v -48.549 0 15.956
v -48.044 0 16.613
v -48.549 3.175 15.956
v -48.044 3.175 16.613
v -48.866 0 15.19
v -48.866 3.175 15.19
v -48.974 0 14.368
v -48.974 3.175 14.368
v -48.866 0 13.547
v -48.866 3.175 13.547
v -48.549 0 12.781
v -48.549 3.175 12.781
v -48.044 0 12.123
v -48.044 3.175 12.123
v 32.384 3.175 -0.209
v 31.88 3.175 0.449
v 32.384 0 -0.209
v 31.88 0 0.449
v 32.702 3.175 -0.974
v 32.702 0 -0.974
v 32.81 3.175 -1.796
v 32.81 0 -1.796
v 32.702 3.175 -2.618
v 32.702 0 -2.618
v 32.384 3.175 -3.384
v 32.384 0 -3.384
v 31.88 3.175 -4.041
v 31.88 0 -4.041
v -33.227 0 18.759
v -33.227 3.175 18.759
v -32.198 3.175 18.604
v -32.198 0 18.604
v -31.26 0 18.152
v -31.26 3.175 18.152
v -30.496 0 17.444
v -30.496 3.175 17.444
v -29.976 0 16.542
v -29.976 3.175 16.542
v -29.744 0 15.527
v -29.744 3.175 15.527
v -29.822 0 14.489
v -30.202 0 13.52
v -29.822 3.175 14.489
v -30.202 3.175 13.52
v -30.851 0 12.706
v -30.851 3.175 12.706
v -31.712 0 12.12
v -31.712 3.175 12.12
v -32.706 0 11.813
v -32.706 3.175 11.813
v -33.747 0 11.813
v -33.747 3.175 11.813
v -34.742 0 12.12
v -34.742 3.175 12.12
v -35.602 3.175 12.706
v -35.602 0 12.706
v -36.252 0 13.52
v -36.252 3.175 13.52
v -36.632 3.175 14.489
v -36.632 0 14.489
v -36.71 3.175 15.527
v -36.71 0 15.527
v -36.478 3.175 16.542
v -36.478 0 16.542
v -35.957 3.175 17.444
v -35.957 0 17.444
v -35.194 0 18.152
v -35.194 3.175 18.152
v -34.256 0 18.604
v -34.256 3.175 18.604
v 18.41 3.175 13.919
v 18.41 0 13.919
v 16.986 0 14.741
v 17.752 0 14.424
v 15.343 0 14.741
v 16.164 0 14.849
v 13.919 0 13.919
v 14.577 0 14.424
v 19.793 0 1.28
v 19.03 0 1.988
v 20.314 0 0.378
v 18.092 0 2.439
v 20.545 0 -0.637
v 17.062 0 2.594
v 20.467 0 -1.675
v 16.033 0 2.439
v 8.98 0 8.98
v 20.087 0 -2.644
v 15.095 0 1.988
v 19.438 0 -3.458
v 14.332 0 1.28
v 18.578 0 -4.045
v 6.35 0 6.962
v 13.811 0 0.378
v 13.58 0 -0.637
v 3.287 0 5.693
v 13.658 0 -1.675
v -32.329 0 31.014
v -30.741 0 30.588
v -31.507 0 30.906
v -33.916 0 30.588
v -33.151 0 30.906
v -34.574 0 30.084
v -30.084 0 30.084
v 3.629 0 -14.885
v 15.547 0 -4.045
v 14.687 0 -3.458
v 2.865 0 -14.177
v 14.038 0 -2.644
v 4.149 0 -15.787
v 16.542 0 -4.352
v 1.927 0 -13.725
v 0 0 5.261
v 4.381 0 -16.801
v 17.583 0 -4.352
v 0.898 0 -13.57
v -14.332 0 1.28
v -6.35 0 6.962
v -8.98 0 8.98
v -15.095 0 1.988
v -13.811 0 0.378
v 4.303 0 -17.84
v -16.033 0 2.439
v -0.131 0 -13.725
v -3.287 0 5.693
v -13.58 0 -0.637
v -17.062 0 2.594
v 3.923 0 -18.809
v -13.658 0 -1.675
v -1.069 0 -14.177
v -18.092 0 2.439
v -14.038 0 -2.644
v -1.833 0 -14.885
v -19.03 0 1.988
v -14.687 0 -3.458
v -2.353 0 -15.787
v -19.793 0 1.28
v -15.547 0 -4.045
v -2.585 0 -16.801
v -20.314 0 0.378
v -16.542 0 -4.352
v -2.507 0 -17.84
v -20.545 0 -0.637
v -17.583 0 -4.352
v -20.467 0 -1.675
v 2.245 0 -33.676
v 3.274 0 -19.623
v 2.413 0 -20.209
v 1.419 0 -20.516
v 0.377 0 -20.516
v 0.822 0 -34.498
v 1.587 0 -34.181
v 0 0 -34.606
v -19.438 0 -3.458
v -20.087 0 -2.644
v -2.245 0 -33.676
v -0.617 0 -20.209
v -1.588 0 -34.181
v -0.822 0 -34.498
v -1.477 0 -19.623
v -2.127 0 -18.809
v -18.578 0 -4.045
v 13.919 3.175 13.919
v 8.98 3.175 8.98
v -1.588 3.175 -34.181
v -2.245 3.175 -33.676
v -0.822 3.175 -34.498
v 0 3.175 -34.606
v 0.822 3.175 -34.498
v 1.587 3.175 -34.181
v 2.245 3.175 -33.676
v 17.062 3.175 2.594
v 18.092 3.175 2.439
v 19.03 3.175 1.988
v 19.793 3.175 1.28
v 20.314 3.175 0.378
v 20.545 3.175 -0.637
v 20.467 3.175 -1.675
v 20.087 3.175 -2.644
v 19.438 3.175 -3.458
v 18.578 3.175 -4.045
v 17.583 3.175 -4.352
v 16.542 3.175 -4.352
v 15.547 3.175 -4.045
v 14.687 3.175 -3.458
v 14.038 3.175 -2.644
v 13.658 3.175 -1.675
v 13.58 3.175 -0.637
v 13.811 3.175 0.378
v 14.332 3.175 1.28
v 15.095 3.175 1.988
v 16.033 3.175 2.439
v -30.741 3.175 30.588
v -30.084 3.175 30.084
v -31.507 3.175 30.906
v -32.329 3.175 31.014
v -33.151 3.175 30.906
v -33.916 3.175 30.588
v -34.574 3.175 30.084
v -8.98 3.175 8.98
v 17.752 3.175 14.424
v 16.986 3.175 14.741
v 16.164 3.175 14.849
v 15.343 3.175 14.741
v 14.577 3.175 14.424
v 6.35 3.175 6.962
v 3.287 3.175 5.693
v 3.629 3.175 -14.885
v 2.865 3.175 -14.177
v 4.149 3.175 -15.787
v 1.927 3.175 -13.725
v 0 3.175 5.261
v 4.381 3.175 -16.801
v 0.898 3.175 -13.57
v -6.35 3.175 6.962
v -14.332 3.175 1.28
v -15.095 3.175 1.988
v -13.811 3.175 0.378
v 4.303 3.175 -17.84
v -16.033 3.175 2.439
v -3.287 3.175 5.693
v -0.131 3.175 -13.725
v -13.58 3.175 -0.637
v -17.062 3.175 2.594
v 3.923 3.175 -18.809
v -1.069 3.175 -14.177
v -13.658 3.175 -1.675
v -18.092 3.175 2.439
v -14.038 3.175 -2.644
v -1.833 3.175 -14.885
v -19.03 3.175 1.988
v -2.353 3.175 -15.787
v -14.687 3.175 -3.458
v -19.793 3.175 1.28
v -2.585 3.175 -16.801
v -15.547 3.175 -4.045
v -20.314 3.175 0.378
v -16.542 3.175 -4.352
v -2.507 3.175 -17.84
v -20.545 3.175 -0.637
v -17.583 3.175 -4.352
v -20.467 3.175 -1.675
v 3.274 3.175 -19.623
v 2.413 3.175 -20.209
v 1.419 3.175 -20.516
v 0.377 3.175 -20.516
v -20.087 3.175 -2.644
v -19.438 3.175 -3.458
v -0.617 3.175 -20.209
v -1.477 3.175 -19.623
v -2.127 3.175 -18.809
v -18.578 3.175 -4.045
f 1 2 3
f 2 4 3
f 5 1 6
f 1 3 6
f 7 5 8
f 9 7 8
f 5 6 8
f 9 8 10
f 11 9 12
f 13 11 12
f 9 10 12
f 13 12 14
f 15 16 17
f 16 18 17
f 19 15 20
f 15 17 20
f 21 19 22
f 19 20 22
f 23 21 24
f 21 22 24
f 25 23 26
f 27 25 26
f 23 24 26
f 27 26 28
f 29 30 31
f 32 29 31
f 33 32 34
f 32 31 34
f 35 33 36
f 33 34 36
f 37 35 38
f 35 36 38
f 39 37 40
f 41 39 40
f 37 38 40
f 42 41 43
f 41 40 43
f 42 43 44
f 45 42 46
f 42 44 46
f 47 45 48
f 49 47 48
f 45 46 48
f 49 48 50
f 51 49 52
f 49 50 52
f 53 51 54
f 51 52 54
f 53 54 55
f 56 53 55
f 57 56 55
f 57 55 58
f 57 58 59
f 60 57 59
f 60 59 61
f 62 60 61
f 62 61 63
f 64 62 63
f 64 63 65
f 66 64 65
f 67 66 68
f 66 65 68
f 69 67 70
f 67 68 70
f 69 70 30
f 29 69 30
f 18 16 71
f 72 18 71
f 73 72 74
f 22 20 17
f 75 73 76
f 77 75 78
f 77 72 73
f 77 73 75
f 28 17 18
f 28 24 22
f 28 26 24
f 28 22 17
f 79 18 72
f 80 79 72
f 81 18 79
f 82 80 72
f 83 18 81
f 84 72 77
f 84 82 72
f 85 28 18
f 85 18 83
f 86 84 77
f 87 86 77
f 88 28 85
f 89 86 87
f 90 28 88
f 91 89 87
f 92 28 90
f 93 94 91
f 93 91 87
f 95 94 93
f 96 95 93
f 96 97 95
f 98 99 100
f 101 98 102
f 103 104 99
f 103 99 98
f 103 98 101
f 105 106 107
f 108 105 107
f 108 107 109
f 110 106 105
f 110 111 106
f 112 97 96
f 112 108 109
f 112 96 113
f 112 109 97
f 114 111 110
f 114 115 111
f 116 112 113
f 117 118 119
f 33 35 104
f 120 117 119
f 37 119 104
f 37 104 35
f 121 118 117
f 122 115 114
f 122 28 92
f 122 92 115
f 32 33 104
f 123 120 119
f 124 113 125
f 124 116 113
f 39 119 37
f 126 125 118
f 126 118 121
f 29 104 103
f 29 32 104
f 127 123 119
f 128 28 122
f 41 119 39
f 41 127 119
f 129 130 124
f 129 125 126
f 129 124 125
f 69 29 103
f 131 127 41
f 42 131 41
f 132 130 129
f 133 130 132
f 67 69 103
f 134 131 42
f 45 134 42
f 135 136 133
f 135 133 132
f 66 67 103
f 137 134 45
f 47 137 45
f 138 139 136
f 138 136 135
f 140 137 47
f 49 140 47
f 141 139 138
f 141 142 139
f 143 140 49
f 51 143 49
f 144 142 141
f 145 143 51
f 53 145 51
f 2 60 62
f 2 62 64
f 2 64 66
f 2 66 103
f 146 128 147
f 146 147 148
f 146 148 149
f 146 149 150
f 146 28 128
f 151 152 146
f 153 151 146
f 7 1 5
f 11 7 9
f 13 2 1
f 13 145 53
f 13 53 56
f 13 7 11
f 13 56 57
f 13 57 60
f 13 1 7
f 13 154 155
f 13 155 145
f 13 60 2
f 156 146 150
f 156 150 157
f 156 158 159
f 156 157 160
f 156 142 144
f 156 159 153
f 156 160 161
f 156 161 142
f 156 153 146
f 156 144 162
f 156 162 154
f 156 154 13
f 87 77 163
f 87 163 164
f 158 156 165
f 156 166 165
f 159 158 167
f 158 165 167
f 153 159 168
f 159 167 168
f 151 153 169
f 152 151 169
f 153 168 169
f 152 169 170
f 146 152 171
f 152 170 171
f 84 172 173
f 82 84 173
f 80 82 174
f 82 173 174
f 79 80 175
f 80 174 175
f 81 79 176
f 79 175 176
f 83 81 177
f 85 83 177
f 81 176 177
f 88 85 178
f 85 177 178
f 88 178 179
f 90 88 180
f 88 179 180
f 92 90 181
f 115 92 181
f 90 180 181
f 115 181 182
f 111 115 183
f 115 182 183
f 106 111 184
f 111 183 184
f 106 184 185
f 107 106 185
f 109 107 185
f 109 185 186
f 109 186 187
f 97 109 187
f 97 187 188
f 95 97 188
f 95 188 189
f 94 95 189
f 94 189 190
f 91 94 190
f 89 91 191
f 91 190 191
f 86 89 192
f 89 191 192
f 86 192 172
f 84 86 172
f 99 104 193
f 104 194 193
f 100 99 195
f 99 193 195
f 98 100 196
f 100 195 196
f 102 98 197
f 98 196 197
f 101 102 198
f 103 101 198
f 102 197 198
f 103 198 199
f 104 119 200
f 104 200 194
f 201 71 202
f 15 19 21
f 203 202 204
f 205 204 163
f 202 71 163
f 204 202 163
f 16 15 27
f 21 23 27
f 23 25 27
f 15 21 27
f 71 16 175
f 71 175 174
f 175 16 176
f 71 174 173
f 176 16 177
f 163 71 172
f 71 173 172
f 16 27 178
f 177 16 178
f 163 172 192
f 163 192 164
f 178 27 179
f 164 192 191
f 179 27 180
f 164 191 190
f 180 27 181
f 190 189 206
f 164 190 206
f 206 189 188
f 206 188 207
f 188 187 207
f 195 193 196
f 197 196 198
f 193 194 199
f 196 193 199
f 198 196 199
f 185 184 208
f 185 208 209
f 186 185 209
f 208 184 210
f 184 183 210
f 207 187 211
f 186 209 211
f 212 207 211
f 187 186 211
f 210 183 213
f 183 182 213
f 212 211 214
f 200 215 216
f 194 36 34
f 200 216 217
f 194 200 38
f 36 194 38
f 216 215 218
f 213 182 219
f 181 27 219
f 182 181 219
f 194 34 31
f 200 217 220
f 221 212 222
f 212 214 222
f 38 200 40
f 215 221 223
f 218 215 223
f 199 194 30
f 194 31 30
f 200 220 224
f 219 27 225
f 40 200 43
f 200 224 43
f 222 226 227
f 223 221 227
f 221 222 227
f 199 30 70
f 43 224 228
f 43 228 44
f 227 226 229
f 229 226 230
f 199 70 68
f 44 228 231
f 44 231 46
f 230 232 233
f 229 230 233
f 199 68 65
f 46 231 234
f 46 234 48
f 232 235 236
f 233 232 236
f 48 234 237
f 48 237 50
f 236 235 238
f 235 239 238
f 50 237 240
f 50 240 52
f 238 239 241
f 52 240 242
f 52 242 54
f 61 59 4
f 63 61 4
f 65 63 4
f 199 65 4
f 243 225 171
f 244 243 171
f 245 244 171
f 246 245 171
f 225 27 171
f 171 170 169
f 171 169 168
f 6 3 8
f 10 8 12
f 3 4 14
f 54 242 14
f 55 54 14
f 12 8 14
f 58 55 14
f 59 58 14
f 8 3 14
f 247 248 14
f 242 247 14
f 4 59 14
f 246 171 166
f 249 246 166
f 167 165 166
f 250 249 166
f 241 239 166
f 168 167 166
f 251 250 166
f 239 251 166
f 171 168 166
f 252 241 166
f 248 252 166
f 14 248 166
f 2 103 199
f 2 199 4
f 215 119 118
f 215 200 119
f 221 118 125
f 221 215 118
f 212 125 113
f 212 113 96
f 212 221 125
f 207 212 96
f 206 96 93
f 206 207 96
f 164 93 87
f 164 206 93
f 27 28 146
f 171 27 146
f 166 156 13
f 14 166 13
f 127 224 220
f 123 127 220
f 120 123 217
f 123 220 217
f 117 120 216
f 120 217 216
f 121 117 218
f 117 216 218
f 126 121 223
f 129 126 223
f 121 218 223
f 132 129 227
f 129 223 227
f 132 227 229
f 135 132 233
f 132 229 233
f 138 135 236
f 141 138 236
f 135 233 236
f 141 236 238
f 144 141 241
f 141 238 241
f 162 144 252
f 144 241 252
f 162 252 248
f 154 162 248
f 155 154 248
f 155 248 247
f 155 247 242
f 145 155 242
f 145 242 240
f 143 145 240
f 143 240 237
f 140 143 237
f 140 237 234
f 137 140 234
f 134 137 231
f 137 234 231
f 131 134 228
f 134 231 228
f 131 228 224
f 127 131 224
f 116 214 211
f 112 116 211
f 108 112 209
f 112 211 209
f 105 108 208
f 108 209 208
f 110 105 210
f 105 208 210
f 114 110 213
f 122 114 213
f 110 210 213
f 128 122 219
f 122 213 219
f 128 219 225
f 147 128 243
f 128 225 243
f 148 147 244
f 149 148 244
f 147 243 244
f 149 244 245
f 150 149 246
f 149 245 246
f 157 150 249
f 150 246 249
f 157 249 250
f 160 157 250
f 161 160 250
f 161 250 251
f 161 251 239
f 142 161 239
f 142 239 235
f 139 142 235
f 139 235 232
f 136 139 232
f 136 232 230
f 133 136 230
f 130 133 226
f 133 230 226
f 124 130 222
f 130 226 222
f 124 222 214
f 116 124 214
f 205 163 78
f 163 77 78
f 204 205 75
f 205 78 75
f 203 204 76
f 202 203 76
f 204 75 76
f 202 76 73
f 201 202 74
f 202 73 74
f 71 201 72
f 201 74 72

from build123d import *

# Parameters (mm, degrees)
BOSS_EXTRUDE1_DEPTH = 3.175
SKETCH2_R           = 3.4925
CUT_EXTRUDE2_DEPTH  = 3.175
LPATTERN5_COUNT     = 2
LPATTERN5_PITCH     = 22.86
SKETCH7_R           = 3.4925
CUT_EXTRUDE3_DEPTH  = 3.175
LPATTERN6_COUNT     = 3
LPATTERN6_PITCH     = 22.86
SKETCH8_R           = 3.4925
CUT_EXTRUDE4_DEPTH  = 62.882370874
FILLET1_R           = 12.7
FILLET2_R           = 3.175


with BuildPart() as part:
    # Sketch1 → Boss-Extrude1 (new body)
    with BuildSketch(Plane(origin=(0, 0, 0), x_dir=(1, 0, 0), z_dir=(0, 1, 0))):
        Polygon((-17.960512242, 17.960512242), (0, 35.921024484), (17.960512242, 17.960512242), (50.289434278, -14.368409794), (32.328922036, -32.328922036), (0, 0), (-32.328922036, -32.328922036), (-50.289434278, -14.368409794), align=None)
    extrude(amount=BOSS_EXTRUDE1_DEPTH)

    # Sketch2 → Cut-Extrude2 (cut)
    with BuildSketch(Plane(origin=(0, 3.175, 0), x_dir=(1, 0, 0), z_dir=(0, 1, 0))):
        with Locations(Location((-33.226947648, -15.266435406, 0), (0, 0, 270))):
            Circle(SKETCH2_R)
    cut_extrude2 = extrude(amount=-CUT_EXTRUDE2_DEPTH, mode=Mode.SUBTRACT)

    # LPattern5: Cut-Extrude2 ×2
    with Locations(*[Vector(0.7071067811865465, 0, -0.7071067811865487) * (i * LPATTERN5_PITCH) for i in range(1, LPATTERN5_COUNT)]):
        add(cut_extrude2, mode=Mode.SUBTRACT)

    # Sketch7 → Cut-Extrude3 (cut)
    with BuildSketch(Plane(origin=(0, 3.175, 0), x_dir=(1, 0, 0), z_dir=(0, 1, 0))):
        with Locations(Location((33.226947648, -15.266435406, 0), (0, 0, 270))):
            Circle(SKETCH7_R)
    cut_extrude3 = extrude(amount=-CUT_EXTRUDE3_DEPTH, mode=Mode.SUBTRACT)

    # LPattern6: Cut-Extrude3 ×3
    with Locations(*[Vector(-0.7071067811865456, 0, -0.7071067811865496) * (i * LPATTERN6_PITCH) for i in range(1, LPATTERN6_COUNT)]):
        add(cut_extrude3, mode=Mode.SUBTRACT)

    # Sketch8 → Cut-Extrude4 (cut, through all)
    with BuildSketch(Plane(origin=(0, 3.175, 0), x_dir=(1, 0, 0), z_dir=(0, 1, 0))):
        Polygon((16.164461018, -16.164461018), (32.328922036, -32.328922036), (50.289434278, -14.368409794), (34.12497326, 1.796051224), align=None)
        with Locations((33.226947648, -15.266435406)):
            Circle(SKETCH8_R, mode=Mode.SUBTRACT)
    extrude(amount=-CUT_EXTRUDE4_DEPTH, mode=Mode.SUBTRACT)

    # Fillet1
    fillet1_edges = [part.edges().sort_by_distance(p)[0] for p in [
        (0, 1.5875, 0),
    ]]
    fillet(fillet1_edges, radius=FILLET1_R)

    # Fillet2
    fillet2_edges = [part.edges().sort_by_distance(p)[0] for p in [
        (0, 1.5875, -35.921024484),
        (-32.328922036, 1.5875, 32.328922036),
        (-50.289434278, 1.5875, 14.368409794),
        (16.164461018, 1.5875, 16.164461018),
        (34.12497326, 1.5875, -1.796051224),
    ]]
    fillet(fillet2_edges, radius=FILLET2_R)


solid = part.part
